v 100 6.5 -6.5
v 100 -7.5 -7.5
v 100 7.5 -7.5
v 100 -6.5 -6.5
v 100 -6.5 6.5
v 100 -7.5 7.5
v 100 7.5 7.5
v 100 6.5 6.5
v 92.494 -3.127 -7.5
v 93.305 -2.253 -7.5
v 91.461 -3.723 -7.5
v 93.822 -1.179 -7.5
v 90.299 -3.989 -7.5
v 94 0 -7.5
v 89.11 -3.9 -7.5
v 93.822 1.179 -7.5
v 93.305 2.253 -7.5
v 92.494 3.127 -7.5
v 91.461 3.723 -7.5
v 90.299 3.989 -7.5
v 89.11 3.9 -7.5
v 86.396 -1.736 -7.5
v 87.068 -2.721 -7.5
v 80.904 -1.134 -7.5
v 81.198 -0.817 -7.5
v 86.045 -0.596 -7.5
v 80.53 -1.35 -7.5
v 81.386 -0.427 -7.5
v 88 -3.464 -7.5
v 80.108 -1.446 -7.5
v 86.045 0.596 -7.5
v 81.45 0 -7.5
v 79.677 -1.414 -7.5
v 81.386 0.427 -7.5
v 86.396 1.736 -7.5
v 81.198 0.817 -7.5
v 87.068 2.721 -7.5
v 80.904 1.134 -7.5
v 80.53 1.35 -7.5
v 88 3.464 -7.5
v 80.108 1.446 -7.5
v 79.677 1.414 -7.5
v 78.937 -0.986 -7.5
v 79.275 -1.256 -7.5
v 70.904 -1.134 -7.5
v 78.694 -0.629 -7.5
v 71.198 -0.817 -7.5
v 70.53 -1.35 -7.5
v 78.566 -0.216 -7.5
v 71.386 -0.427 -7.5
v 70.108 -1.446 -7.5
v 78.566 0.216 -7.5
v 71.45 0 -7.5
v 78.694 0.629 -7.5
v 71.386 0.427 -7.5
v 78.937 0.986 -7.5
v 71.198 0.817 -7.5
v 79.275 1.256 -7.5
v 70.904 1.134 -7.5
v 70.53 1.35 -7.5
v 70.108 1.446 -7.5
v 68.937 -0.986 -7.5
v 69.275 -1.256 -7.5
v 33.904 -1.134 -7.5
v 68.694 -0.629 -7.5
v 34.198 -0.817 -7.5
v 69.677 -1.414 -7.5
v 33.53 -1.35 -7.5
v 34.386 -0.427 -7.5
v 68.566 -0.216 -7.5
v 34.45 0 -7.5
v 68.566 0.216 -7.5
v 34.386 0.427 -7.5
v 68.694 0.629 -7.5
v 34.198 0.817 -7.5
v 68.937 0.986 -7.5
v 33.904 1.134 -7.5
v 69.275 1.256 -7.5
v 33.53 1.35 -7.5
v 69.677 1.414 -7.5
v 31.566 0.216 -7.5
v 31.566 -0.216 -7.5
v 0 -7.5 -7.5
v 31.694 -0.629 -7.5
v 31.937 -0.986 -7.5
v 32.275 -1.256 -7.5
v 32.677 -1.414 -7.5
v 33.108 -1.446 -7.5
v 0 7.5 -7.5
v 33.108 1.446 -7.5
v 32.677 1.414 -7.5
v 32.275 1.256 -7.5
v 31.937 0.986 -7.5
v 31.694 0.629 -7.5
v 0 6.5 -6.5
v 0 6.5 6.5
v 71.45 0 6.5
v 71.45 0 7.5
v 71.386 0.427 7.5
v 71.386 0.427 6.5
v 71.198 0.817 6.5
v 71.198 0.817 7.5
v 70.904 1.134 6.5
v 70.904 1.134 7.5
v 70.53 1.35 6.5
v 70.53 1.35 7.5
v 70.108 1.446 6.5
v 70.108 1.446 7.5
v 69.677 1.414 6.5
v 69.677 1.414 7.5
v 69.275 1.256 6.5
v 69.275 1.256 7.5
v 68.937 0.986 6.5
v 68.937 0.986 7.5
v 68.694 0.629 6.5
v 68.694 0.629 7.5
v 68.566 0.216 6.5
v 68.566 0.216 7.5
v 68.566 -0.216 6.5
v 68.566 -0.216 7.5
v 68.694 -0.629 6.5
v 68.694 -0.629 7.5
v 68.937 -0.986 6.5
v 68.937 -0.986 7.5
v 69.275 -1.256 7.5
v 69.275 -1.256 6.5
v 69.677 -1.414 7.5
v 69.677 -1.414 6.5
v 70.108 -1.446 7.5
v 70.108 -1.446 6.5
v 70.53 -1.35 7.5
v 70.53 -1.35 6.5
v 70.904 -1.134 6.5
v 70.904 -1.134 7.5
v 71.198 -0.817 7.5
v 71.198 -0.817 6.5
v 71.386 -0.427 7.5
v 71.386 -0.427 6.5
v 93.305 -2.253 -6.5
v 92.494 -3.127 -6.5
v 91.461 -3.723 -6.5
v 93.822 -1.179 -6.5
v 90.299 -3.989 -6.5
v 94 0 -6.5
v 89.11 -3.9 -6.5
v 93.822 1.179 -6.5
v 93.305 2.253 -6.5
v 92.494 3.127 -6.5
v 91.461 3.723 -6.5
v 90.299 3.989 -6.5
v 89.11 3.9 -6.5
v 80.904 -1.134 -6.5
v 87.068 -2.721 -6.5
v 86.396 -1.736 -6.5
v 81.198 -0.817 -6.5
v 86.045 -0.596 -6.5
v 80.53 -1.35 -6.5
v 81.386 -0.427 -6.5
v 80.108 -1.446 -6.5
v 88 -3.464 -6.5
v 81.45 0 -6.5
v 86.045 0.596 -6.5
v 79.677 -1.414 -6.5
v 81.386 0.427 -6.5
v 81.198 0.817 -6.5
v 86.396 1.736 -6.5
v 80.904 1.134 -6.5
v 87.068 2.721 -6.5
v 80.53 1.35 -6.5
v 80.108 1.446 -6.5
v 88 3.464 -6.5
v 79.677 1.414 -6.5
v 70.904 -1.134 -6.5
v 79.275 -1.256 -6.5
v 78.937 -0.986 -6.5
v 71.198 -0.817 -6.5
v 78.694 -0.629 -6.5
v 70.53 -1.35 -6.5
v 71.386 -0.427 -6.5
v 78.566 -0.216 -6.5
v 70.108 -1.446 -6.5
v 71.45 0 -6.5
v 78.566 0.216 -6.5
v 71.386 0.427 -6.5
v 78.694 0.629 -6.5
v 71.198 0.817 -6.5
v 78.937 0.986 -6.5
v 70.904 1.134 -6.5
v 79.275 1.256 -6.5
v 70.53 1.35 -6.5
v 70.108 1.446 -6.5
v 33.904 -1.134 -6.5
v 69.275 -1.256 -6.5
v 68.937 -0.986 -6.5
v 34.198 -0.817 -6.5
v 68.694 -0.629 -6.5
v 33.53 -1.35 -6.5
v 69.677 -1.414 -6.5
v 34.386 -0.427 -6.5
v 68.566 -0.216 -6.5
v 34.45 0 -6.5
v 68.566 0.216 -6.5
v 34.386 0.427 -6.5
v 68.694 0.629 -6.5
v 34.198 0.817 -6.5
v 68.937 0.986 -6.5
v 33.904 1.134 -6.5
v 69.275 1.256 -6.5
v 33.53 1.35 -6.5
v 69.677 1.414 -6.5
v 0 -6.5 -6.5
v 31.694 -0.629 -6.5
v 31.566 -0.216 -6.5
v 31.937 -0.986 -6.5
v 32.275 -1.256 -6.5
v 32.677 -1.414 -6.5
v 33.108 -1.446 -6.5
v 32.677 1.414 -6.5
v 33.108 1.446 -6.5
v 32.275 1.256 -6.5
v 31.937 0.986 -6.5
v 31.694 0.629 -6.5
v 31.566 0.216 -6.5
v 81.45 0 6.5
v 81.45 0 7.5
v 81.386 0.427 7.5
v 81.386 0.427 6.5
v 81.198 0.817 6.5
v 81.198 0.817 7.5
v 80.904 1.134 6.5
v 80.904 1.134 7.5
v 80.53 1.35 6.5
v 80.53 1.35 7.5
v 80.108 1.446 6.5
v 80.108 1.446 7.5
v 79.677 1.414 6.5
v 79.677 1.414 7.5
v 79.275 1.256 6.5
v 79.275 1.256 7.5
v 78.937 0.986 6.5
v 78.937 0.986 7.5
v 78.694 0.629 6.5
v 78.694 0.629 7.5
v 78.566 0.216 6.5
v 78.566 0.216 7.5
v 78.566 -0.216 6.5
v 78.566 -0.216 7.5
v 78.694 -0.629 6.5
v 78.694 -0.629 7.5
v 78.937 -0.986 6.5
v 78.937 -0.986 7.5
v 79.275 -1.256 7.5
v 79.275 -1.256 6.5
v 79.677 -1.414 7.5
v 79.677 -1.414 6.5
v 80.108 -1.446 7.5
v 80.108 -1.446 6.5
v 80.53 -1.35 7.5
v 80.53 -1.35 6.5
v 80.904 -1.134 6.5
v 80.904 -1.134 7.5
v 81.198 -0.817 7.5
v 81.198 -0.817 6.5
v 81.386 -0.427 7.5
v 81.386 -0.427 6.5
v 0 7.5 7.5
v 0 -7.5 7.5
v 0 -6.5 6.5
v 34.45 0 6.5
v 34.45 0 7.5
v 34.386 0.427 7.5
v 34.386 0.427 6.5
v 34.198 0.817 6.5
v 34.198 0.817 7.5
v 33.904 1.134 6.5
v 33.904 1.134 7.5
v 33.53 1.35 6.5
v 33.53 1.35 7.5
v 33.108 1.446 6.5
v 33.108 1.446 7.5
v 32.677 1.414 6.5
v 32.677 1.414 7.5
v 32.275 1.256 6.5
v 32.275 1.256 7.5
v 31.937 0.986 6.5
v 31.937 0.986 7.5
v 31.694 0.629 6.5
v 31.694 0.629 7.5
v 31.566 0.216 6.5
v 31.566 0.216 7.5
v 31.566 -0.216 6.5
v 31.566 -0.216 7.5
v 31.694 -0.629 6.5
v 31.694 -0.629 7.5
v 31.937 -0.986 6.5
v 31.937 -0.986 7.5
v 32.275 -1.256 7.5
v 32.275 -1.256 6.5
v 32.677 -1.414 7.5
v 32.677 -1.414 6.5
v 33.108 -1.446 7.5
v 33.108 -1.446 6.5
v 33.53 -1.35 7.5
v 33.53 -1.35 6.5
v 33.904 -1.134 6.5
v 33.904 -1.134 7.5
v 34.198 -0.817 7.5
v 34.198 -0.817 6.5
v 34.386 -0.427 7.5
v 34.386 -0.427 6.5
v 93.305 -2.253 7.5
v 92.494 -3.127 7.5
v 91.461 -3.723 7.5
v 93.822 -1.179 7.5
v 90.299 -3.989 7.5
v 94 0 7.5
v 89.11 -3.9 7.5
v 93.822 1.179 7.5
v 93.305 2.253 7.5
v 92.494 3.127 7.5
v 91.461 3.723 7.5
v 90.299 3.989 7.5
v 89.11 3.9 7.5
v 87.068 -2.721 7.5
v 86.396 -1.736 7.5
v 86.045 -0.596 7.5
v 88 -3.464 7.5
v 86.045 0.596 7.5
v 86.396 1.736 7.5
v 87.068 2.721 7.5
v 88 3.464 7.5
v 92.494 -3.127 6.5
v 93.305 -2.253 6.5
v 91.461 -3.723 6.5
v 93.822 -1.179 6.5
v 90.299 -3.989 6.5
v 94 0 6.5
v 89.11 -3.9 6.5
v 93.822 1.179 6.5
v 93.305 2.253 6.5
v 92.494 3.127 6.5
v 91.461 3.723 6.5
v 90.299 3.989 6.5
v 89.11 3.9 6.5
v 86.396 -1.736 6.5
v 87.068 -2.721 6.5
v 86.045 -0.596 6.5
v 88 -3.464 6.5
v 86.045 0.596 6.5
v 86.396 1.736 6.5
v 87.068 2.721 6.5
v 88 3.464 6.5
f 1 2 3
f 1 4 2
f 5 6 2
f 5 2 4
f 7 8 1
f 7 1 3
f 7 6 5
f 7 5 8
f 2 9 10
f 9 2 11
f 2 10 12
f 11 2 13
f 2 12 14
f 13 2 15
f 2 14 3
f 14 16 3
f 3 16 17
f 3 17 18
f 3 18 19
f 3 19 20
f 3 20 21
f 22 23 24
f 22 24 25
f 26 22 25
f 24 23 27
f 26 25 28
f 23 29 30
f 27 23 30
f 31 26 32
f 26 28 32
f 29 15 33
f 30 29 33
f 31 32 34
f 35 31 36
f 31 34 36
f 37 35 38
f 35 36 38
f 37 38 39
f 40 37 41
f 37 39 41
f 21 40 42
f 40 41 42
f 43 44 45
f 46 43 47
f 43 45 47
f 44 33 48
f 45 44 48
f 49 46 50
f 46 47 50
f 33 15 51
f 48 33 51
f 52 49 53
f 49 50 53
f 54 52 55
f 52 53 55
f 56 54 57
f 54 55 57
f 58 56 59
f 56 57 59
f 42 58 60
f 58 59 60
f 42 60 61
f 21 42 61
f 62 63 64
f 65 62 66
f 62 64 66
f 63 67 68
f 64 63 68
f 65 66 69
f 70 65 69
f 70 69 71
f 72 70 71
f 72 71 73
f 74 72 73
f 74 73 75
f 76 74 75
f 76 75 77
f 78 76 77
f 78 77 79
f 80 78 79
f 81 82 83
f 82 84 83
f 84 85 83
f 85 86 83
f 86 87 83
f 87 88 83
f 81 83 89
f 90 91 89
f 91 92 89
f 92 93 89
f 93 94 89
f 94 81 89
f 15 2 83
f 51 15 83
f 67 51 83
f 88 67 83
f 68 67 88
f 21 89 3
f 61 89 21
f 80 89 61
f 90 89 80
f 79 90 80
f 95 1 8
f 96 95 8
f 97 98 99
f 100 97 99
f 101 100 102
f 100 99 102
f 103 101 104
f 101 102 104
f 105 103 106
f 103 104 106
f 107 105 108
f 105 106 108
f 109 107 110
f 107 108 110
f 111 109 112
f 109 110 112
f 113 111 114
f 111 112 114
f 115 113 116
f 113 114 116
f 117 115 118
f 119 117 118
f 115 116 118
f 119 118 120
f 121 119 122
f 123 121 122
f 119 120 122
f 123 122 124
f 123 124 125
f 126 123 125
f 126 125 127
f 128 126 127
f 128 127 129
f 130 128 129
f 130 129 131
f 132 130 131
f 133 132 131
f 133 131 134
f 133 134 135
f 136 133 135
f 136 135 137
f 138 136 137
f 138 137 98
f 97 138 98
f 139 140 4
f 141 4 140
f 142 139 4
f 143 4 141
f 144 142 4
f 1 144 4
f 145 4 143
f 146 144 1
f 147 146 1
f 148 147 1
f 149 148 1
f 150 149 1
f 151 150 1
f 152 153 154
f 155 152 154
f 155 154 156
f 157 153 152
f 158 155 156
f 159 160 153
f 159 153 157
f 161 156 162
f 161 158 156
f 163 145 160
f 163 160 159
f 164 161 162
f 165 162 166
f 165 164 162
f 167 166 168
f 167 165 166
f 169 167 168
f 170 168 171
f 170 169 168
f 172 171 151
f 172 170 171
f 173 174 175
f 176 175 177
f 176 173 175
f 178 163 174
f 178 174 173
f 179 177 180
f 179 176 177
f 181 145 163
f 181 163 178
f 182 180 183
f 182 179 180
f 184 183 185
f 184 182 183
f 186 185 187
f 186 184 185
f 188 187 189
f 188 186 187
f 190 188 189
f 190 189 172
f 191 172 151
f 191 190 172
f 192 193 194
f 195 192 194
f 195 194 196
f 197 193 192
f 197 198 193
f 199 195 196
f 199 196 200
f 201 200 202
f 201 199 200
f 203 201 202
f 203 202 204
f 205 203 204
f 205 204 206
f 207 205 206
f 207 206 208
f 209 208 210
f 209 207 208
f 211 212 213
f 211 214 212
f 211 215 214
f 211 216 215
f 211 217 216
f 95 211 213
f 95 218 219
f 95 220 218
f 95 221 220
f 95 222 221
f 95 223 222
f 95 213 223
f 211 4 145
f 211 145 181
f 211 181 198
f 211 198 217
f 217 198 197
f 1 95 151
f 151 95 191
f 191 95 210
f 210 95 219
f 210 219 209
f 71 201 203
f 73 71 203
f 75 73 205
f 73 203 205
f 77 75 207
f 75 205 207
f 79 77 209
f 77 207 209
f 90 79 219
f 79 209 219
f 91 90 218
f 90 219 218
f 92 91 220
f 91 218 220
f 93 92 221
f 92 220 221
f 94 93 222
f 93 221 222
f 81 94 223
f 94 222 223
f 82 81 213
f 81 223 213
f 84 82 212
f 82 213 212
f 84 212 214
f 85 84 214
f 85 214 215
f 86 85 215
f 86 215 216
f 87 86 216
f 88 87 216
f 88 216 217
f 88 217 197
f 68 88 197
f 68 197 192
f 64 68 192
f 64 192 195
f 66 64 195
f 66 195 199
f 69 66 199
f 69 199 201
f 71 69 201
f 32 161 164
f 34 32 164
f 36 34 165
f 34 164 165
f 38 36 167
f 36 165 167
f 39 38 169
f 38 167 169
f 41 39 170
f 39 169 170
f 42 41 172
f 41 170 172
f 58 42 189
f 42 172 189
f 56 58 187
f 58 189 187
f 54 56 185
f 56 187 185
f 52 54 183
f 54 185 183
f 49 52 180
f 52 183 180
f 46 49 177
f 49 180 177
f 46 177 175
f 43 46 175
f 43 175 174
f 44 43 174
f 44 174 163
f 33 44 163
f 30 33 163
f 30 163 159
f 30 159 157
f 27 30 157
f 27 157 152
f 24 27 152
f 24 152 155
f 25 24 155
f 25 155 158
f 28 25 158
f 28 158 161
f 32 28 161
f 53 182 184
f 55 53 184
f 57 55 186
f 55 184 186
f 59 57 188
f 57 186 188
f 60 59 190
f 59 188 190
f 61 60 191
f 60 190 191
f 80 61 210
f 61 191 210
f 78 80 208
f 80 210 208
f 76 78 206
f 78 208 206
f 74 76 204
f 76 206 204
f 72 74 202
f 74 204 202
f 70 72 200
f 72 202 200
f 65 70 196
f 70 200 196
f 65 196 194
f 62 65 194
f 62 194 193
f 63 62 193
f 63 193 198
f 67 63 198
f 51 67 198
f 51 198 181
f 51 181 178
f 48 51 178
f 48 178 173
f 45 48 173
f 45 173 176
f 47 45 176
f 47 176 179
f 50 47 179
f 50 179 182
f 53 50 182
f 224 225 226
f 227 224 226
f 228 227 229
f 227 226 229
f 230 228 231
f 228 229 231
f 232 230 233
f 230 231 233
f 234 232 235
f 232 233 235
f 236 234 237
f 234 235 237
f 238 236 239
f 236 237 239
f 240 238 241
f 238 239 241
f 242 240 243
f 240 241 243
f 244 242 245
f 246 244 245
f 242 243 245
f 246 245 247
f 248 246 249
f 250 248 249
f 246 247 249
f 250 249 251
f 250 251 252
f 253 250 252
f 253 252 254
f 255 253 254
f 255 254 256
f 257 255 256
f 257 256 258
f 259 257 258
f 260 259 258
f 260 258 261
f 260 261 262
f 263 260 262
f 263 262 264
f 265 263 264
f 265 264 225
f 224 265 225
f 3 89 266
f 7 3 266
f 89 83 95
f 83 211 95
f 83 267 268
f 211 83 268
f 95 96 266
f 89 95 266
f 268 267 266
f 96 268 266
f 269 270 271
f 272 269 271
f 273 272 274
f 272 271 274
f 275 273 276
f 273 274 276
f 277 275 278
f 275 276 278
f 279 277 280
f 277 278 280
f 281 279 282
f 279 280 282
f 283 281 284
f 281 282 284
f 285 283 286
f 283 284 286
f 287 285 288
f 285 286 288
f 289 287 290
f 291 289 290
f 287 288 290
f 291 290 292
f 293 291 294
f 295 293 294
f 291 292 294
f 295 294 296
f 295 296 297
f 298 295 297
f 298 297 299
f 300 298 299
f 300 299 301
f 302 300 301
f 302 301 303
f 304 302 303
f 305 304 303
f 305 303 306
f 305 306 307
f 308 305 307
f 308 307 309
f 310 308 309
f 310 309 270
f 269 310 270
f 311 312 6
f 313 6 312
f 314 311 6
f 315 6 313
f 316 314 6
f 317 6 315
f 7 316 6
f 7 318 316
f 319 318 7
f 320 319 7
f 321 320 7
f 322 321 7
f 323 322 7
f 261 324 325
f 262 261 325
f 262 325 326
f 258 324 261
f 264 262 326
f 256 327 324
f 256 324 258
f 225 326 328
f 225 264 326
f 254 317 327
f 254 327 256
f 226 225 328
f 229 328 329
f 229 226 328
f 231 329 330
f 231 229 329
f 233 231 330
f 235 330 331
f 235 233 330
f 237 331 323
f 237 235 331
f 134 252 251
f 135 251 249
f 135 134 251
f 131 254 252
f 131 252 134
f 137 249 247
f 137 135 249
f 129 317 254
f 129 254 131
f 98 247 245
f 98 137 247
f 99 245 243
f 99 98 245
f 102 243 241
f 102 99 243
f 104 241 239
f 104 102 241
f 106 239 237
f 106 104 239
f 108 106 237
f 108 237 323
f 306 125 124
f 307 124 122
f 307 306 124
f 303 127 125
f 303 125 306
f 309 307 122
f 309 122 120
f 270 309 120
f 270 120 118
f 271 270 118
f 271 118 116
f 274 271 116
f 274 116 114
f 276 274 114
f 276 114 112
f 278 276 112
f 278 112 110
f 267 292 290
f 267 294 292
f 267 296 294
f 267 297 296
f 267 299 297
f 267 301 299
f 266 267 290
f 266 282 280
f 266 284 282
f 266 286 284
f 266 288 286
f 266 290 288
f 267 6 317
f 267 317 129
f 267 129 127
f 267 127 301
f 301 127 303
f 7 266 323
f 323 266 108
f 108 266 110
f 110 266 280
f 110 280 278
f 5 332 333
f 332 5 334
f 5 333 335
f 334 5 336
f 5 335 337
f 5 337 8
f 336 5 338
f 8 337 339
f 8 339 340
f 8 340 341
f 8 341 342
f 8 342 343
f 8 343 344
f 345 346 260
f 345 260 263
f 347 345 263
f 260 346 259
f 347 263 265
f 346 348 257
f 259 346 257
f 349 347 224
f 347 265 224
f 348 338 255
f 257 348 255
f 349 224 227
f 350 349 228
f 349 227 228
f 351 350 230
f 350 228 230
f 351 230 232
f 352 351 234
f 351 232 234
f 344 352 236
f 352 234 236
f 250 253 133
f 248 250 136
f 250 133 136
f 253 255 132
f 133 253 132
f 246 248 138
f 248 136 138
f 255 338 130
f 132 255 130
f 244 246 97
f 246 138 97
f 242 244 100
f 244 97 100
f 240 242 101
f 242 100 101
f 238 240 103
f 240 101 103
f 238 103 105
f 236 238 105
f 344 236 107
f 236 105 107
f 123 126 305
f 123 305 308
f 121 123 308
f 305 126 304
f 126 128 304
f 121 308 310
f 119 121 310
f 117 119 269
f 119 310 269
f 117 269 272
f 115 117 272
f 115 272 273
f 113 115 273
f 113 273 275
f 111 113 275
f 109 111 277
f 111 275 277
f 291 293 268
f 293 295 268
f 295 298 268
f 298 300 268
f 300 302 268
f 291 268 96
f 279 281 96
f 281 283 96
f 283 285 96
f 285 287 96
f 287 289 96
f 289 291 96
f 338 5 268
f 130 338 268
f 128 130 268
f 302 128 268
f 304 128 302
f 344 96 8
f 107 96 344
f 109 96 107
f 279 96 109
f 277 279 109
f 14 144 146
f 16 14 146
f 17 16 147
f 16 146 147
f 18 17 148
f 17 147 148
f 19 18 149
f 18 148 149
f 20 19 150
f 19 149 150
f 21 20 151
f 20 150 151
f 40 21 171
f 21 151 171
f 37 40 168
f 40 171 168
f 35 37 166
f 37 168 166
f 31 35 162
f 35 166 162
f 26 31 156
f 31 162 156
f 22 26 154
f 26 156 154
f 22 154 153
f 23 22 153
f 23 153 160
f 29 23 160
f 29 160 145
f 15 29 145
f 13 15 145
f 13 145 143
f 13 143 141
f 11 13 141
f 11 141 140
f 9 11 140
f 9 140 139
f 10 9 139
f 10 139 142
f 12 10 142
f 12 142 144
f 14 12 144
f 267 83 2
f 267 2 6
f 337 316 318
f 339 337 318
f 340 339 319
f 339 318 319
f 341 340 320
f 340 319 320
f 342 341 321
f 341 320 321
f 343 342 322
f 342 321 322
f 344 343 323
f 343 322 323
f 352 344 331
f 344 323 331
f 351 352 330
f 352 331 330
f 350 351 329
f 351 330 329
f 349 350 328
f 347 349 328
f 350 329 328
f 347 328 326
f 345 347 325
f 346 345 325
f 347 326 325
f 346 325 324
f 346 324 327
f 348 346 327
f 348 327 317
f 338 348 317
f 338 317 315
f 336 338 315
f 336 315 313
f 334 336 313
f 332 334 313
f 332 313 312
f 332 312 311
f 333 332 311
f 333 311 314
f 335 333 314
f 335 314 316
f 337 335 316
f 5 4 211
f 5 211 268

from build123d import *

# Parameters (mm, degrees)
SKETCH_11_W         = 15
SKETCH_11_H         = 15
SKETCH_11_W_2       = 13
SKETCH_11_H_2       = 13
F_15X15X1_1_DEPTH   = 100
SKETCH_12_R         = 1.45
CUT_EXTRUDE_1_DEPTH = 22
SKETCH_13_R         = 4
SKETCH_13_R_2       = 1.45
CUT_EXTRUDE_2_DEPTH = 102.396498953


with BuildPart() as part:
    # 草图11 → 铝管 15X15X1(1) (new body)
    with BuildSketch(Plane.YZ):
        Rectangle(SKETCH_11_W, SKETCH_11_H)
        Rectangle(SKETCH_11_W_2, SKETCH_11_H_2, mode=Mode.SUBTRACT)
    extrude(amount=F_15X15X1_1_DEPTH)

    # 草图12 → 切除-拉伸1 (cut)
    with BuildSketch(Plane.XY.offset(7.5)):
        with Locations((33, 0)):
            Circle(SKETCH_12_R)
    extrude(amount=-CUT_EXTRUDE_1_DEPTH, mode=Mode.SUBTRACT)

    # 草图13 → 切除-拉伸2 (cut, through all)
    with BuildSketch(Plane.XY.offset(7.5)):
        with Locations((90, 0)):
            Circle(SKETCH_13_R)
        with Locations((80, 0)):
            Circle(SKETCH_13_R_2)
        with Locations((70, 0)):
            Circle(SKETCH_13_R_2)
    extrude(amount=-CUT_EXTRUDE_2_DEPTH, mode=Mode.SUBTRACT)


solid = part.part
